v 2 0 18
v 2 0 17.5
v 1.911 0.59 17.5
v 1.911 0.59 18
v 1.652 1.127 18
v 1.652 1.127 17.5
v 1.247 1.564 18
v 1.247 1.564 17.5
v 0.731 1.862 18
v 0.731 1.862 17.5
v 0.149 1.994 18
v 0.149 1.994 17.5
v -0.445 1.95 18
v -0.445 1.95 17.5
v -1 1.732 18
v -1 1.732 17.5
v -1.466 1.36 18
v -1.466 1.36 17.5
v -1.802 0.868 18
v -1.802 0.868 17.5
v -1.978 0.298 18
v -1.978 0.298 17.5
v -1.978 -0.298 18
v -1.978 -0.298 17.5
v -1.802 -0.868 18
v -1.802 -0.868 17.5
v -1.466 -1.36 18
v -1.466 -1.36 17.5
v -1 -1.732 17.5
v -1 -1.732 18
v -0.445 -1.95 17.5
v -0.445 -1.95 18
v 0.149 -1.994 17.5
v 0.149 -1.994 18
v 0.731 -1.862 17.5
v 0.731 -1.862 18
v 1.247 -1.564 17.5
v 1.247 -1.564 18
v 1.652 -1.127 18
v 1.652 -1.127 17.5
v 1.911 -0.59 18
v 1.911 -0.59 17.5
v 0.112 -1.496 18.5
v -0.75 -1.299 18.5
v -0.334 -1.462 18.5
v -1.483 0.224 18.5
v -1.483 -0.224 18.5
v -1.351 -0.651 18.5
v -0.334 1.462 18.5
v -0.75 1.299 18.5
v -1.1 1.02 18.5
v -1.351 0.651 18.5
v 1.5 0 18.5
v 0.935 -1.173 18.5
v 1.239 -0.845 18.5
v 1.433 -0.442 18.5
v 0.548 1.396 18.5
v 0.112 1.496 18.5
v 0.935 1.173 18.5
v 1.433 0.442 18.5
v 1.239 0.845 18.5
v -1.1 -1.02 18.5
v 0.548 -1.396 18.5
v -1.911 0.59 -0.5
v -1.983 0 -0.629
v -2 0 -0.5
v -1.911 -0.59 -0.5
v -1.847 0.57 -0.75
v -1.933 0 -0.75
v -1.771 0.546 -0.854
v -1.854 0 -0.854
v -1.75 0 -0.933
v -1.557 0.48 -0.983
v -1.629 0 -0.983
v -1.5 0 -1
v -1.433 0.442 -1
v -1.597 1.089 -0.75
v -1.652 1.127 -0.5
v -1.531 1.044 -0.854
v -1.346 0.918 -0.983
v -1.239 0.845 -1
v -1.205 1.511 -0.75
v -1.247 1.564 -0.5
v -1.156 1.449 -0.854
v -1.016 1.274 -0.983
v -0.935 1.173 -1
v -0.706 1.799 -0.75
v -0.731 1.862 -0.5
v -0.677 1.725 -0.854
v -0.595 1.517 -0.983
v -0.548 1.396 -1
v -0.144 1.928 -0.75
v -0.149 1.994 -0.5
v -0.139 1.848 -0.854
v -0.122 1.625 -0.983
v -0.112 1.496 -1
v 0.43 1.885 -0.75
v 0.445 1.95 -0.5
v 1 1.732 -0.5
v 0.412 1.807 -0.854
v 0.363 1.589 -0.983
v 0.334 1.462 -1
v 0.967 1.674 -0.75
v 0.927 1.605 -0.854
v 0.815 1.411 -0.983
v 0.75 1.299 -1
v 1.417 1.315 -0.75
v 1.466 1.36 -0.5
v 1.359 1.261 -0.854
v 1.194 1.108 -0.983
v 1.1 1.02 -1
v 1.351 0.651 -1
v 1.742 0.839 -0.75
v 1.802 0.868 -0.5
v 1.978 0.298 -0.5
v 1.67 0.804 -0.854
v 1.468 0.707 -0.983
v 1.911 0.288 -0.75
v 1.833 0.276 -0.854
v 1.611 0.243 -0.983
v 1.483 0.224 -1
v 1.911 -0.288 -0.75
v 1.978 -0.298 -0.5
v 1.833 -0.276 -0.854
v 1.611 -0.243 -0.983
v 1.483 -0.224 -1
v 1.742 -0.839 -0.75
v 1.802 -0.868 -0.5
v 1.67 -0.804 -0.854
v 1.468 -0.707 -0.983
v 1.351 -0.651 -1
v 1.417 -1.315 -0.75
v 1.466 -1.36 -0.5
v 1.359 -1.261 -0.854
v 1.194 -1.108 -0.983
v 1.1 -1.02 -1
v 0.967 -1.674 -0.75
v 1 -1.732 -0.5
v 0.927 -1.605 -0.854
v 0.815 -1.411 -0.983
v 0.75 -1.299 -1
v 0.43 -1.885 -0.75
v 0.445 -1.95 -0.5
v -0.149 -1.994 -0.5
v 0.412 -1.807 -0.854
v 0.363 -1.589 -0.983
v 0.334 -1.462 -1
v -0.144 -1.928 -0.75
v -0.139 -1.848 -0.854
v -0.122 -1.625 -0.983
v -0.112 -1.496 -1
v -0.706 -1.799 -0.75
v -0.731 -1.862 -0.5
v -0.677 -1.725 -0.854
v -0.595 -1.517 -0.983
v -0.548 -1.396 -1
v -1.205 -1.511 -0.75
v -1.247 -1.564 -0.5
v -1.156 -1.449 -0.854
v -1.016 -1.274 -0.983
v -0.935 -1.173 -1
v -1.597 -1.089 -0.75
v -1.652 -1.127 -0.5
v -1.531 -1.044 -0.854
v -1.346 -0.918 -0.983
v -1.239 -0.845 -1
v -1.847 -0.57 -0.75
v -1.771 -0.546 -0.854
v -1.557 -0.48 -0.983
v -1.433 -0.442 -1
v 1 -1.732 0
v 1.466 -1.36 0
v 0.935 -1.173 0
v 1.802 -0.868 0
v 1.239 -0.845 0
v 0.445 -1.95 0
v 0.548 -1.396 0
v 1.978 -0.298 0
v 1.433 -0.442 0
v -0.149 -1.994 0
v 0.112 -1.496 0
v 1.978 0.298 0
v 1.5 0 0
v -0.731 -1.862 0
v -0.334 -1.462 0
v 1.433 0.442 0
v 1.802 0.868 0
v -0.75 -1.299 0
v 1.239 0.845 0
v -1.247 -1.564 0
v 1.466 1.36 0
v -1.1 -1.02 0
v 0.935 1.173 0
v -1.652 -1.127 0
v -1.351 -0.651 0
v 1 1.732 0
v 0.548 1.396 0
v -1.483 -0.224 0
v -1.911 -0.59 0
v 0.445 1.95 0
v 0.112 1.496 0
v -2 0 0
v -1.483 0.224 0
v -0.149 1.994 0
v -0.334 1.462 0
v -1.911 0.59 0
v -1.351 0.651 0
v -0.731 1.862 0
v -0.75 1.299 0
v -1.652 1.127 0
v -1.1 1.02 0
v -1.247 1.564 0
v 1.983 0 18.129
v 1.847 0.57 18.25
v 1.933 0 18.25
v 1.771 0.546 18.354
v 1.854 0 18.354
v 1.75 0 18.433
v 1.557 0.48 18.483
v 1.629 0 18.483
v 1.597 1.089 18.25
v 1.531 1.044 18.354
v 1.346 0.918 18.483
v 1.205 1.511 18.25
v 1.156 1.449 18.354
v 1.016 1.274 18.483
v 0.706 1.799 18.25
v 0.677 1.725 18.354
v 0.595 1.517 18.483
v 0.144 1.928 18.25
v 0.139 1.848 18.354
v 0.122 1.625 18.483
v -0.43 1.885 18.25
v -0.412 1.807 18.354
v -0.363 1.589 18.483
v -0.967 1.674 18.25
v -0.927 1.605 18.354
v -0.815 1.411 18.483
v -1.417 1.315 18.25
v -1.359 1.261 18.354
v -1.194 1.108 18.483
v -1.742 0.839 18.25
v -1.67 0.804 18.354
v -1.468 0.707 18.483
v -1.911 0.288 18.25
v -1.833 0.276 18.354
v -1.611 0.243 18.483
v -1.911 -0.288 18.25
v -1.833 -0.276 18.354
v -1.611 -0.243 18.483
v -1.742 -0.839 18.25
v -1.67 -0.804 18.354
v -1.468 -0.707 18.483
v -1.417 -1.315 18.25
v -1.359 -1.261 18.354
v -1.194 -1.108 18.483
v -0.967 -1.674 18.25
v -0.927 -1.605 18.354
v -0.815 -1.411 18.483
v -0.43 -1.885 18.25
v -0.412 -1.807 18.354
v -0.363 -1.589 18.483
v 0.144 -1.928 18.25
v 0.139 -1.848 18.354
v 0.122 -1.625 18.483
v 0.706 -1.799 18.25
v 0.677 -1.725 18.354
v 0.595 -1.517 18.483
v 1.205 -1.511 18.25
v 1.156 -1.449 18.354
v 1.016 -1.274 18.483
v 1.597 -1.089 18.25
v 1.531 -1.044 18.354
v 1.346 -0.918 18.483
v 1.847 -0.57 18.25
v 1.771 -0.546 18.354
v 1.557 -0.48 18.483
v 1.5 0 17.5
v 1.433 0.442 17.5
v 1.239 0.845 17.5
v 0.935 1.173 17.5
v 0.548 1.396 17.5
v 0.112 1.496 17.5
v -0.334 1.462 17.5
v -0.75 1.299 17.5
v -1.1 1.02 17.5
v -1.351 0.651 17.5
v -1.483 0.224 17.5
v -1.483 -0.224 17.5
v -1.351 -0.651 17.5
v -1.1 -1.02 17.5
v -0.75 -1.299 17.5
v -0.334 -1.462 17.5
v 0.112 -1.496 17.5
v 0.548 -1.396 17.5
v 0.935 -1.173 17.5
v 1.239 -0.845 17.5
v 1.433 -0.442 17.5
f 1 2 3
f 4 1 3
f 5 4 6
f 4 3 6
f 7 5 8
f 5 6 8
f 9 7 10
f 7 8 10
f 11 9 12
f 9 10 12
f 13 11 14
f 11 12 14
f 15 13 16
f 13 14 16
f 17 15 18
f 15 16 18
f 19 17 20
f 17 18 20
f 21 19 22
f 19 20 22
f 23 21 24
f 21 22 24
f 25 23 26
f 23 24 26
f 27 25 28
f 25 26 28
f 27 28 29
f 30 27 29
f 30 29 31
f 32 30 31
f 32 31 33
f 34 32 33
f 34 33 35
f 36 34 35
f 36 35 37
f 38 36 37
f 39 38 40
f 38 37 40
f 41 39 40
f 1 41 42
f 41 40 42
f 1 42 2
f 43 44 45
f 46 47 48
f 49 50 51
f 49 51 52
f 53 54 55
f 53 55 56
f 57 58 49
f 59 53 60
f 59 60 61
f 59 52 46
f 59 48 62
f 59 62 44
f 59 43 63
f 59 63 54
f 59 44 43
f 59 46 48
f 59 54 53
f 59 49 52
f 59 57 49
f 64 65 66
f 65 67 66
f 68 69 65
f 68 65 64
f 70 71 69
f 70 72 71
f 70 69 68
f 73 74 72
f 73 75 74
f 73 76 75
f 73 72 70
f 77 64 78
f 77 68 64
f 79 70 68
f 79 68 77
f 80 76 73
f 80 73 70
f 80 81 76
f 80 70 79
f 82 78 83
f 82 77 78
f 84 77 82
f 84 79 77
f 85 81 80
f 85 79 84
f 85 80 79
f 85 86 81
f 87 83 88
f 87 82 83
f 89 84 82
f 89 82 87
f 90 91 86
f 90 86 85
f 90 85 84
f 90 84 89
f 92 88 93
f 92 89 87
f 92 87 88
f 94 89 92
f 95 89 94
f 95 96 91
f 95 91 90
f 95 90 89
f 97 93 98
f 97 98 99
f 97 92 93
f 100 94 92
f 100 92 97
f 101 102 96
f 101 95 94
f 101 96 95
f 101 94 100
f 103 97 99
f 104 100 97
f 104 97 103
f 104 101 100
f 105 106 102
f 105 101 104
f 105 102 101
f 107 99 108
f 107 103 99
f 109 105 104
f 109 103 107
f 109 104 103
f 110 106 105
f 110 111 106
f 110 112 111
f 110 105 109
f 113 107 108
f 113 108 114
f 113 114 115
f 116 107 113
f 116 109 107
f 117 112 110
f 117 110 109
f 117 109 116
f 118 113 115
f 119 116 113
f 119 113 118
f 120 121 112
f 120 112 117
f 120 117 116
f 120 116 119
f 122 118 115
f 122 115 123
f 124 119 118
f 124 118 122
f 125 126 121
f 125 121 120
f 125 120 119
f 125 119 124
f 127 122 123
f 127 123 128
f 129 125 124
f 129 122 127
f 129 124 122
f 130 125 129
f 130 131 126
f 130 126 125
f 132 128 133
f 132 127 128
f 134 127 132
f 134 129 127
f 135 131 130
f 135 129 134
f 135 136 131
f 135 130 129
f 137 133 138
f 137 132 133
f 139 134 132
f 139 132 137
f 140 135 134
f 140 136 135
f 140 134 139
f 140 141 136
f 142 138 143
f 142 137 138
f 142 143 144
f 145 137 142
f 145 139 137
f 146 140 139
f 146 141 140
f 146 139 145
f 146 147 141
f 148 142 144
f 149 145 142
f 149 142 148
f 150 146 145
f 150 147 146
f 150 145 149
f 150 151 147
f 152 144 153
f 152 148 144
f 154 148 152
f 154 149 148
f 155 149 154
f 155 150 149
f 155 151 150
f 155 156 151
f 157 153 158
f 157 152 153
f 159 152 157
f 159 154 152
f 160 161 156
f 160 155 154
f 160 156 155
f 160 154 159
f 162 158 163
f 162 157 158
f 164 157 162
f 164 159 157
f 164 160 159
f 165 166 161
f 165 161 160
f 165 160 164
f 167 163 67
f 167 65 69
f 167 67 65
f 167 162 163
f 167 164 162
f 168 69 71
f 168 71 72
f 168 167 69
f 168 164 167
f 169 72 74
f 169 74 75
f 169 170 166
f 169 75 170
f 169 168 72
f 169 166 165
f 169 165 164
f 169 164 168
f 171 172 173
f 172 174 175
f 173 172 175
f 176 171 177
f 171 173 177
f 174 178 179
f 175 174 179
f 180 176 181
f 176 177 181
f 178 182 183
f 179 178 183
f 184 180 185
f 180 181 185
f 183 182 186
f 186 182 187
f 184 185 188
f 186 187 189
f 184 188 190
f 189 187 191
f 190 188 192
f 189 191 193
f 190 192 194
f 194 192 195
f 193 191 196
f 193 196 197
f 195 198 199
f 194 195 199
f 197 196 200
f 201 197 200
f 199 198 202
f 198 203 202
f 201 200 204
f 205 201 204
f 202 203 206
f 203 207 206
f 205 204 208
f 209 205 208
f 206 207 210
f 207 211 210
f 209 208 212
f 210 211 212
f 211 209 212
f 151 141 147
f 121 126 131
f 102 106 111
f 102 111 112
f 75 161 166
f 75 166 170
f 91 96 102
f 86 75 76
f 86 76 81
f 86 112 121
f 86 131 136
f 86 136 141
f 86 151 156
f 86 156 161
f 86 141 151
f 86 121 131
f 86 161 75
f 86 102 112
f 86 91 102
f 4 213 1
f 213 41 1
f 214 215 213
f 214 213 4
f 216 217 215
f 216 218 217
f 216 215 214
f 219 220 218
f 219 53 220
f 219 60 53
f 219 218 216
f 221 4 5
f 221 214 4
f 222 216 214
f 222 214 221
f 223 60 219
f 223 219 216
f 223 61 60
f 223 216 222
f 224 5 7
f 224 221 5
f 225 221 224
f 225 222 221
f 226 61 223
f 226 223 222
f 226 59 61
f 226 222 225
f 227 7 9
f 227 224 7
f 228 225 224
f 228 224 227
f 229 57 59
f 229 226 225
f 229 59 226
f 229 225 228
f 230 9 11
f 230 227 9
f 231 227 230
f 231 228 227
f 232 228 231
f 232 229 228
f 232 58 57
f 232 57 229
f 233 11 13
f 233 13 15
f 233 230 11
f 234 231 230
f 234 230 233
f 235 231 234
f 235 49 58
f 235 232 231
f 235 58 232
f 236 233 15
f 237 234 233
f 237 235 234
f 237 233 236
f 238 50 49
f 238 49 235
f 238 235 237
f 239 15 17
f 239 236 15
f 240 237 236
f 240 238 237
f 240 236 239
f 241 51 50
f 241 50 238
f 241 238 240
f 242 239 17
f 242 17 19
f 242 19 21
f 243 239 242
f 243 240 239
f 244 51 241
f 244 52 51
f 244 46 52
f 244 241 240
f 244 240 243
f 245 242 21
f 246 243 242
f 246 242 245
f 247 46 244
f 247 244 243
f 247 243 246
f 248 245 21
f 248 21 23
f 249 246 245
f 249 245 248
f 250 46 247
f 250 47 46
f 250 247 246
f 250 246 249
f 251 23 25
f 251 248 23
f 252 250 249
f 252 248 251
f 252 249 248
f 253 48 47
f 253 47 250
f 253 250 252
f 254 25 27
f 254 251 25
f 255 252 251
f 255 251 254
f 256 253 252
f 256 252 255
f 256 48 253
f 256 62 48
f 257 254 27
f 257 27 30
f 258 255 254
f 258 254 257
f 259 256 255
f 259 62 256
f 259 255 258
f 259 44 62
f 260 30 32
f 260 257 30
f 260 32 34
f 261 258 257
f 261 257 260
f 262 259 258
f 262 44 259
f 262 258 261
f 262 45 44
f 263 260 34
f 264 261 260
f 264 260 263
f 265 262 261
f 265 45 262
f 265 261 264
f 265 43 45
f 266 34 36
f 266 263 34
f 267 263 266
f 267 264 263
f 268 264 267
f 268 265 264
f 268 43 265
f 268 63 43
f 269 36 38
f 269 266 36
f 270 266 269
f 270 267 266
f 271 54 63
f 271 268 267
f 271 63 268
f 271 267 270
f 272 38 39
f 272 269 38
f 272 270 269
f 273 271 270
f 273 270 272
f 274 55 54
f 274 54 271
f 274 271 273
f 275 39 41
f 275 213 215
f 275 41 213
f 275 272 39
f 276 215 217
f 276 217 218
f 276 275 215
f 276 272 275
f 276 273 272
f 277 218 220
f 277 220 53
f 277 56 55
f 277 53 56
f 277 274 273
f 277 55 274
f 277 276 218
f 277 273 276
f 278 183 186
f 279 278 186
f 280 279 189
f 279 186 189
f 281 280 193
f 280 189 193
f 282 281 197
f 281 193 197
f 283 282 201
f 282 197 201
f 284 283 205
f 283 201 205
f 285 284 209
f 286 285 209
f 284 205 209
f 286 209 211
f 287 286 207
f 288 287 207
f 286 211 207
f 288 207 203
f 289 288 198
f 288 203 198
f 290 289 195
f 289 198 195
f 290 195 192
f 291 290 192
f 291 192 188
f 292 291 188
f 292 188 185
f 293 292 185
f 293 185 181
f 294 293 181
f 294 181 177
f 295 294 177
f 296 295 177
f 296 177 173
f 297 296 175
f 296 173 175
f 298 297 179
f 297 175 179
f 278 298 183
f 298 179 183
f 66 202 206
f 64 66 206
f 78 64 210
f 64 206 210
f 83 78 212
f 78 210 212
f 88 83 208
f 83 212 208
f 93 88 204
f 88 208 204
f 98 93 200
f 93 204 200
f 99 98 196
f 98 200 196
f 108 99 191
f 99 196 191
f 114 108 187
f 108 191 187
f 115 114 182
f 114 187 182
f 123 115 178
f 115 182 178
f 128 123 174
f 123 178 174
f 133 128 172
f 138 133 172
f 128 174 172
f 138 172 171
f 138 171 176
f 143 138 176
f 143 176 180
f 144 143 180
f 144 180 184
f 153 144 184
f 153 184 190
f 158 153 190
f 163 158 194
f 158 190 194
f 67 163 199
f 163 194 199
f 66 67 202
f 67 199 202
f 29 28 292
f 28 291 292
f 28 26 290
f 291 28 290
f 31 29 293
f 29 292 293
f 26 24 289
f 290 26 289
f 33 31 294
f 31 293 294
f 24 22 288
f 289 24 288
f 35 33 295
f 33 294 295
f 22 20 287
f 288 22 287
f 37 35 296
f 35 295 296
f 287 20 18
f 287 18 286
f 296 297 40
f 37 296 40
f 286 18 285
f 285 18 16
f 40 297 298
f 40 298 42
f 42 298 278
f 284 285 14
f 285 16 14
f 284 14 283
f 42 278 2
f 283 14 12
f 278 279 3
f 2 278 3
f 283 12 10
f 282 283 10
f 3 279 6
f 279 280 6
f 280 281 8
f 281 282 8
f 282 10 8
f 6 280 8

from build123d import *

# Parameters (mm, degrees)
SKETCH1_R           = 1.5
BOSS_EXTRUDE1_DEPTH = 17.5
SKETCH2_R           = 2
BOSS_EXTRUDE2_DEPTH = 1
SKETCH3_R           = 2
BOSS_EXTRUDE3_DEPTH = 1
FILLET1_R           = 0.5


with BuildPart() as part:
    # Sketch1 → Boss-Extrude1 (new body)
    with BuildSketch(Plane.XY):
        Circle(SKETCH1_R)
    extrude(amount=BOSS_EXTRUDE1_DEPTH)

    # Sketch2 → Boss-Extrude2 (add)
    with BuildSketch(Plane(origin=(0, 0, 0), x_dir=(-1, 0, 0), z_dir=(0, 0, -1))):
        Circle(SKETCH2_R)
    extrude(amount=BOSS_EXTRUDE2_DEPTH)

    # Sketch3 → Boss-Extrude3 (add)
    with BuildSketch(Plane.XY.offset(17.5)):
        Circle(SKETCH3_R)
    extrude(amount=BOSS_EXTRUDE3_DEPTH)

    # Fillet1
    fillet1_edges = [part.edges().sort_by_distance(p)[0] for p in [
        (-2, 0, 18.5),
        (2, 0, -1),
    ]]
    fillet(fillet1_edges, radius=FILLET1_R)


solid = part.part
